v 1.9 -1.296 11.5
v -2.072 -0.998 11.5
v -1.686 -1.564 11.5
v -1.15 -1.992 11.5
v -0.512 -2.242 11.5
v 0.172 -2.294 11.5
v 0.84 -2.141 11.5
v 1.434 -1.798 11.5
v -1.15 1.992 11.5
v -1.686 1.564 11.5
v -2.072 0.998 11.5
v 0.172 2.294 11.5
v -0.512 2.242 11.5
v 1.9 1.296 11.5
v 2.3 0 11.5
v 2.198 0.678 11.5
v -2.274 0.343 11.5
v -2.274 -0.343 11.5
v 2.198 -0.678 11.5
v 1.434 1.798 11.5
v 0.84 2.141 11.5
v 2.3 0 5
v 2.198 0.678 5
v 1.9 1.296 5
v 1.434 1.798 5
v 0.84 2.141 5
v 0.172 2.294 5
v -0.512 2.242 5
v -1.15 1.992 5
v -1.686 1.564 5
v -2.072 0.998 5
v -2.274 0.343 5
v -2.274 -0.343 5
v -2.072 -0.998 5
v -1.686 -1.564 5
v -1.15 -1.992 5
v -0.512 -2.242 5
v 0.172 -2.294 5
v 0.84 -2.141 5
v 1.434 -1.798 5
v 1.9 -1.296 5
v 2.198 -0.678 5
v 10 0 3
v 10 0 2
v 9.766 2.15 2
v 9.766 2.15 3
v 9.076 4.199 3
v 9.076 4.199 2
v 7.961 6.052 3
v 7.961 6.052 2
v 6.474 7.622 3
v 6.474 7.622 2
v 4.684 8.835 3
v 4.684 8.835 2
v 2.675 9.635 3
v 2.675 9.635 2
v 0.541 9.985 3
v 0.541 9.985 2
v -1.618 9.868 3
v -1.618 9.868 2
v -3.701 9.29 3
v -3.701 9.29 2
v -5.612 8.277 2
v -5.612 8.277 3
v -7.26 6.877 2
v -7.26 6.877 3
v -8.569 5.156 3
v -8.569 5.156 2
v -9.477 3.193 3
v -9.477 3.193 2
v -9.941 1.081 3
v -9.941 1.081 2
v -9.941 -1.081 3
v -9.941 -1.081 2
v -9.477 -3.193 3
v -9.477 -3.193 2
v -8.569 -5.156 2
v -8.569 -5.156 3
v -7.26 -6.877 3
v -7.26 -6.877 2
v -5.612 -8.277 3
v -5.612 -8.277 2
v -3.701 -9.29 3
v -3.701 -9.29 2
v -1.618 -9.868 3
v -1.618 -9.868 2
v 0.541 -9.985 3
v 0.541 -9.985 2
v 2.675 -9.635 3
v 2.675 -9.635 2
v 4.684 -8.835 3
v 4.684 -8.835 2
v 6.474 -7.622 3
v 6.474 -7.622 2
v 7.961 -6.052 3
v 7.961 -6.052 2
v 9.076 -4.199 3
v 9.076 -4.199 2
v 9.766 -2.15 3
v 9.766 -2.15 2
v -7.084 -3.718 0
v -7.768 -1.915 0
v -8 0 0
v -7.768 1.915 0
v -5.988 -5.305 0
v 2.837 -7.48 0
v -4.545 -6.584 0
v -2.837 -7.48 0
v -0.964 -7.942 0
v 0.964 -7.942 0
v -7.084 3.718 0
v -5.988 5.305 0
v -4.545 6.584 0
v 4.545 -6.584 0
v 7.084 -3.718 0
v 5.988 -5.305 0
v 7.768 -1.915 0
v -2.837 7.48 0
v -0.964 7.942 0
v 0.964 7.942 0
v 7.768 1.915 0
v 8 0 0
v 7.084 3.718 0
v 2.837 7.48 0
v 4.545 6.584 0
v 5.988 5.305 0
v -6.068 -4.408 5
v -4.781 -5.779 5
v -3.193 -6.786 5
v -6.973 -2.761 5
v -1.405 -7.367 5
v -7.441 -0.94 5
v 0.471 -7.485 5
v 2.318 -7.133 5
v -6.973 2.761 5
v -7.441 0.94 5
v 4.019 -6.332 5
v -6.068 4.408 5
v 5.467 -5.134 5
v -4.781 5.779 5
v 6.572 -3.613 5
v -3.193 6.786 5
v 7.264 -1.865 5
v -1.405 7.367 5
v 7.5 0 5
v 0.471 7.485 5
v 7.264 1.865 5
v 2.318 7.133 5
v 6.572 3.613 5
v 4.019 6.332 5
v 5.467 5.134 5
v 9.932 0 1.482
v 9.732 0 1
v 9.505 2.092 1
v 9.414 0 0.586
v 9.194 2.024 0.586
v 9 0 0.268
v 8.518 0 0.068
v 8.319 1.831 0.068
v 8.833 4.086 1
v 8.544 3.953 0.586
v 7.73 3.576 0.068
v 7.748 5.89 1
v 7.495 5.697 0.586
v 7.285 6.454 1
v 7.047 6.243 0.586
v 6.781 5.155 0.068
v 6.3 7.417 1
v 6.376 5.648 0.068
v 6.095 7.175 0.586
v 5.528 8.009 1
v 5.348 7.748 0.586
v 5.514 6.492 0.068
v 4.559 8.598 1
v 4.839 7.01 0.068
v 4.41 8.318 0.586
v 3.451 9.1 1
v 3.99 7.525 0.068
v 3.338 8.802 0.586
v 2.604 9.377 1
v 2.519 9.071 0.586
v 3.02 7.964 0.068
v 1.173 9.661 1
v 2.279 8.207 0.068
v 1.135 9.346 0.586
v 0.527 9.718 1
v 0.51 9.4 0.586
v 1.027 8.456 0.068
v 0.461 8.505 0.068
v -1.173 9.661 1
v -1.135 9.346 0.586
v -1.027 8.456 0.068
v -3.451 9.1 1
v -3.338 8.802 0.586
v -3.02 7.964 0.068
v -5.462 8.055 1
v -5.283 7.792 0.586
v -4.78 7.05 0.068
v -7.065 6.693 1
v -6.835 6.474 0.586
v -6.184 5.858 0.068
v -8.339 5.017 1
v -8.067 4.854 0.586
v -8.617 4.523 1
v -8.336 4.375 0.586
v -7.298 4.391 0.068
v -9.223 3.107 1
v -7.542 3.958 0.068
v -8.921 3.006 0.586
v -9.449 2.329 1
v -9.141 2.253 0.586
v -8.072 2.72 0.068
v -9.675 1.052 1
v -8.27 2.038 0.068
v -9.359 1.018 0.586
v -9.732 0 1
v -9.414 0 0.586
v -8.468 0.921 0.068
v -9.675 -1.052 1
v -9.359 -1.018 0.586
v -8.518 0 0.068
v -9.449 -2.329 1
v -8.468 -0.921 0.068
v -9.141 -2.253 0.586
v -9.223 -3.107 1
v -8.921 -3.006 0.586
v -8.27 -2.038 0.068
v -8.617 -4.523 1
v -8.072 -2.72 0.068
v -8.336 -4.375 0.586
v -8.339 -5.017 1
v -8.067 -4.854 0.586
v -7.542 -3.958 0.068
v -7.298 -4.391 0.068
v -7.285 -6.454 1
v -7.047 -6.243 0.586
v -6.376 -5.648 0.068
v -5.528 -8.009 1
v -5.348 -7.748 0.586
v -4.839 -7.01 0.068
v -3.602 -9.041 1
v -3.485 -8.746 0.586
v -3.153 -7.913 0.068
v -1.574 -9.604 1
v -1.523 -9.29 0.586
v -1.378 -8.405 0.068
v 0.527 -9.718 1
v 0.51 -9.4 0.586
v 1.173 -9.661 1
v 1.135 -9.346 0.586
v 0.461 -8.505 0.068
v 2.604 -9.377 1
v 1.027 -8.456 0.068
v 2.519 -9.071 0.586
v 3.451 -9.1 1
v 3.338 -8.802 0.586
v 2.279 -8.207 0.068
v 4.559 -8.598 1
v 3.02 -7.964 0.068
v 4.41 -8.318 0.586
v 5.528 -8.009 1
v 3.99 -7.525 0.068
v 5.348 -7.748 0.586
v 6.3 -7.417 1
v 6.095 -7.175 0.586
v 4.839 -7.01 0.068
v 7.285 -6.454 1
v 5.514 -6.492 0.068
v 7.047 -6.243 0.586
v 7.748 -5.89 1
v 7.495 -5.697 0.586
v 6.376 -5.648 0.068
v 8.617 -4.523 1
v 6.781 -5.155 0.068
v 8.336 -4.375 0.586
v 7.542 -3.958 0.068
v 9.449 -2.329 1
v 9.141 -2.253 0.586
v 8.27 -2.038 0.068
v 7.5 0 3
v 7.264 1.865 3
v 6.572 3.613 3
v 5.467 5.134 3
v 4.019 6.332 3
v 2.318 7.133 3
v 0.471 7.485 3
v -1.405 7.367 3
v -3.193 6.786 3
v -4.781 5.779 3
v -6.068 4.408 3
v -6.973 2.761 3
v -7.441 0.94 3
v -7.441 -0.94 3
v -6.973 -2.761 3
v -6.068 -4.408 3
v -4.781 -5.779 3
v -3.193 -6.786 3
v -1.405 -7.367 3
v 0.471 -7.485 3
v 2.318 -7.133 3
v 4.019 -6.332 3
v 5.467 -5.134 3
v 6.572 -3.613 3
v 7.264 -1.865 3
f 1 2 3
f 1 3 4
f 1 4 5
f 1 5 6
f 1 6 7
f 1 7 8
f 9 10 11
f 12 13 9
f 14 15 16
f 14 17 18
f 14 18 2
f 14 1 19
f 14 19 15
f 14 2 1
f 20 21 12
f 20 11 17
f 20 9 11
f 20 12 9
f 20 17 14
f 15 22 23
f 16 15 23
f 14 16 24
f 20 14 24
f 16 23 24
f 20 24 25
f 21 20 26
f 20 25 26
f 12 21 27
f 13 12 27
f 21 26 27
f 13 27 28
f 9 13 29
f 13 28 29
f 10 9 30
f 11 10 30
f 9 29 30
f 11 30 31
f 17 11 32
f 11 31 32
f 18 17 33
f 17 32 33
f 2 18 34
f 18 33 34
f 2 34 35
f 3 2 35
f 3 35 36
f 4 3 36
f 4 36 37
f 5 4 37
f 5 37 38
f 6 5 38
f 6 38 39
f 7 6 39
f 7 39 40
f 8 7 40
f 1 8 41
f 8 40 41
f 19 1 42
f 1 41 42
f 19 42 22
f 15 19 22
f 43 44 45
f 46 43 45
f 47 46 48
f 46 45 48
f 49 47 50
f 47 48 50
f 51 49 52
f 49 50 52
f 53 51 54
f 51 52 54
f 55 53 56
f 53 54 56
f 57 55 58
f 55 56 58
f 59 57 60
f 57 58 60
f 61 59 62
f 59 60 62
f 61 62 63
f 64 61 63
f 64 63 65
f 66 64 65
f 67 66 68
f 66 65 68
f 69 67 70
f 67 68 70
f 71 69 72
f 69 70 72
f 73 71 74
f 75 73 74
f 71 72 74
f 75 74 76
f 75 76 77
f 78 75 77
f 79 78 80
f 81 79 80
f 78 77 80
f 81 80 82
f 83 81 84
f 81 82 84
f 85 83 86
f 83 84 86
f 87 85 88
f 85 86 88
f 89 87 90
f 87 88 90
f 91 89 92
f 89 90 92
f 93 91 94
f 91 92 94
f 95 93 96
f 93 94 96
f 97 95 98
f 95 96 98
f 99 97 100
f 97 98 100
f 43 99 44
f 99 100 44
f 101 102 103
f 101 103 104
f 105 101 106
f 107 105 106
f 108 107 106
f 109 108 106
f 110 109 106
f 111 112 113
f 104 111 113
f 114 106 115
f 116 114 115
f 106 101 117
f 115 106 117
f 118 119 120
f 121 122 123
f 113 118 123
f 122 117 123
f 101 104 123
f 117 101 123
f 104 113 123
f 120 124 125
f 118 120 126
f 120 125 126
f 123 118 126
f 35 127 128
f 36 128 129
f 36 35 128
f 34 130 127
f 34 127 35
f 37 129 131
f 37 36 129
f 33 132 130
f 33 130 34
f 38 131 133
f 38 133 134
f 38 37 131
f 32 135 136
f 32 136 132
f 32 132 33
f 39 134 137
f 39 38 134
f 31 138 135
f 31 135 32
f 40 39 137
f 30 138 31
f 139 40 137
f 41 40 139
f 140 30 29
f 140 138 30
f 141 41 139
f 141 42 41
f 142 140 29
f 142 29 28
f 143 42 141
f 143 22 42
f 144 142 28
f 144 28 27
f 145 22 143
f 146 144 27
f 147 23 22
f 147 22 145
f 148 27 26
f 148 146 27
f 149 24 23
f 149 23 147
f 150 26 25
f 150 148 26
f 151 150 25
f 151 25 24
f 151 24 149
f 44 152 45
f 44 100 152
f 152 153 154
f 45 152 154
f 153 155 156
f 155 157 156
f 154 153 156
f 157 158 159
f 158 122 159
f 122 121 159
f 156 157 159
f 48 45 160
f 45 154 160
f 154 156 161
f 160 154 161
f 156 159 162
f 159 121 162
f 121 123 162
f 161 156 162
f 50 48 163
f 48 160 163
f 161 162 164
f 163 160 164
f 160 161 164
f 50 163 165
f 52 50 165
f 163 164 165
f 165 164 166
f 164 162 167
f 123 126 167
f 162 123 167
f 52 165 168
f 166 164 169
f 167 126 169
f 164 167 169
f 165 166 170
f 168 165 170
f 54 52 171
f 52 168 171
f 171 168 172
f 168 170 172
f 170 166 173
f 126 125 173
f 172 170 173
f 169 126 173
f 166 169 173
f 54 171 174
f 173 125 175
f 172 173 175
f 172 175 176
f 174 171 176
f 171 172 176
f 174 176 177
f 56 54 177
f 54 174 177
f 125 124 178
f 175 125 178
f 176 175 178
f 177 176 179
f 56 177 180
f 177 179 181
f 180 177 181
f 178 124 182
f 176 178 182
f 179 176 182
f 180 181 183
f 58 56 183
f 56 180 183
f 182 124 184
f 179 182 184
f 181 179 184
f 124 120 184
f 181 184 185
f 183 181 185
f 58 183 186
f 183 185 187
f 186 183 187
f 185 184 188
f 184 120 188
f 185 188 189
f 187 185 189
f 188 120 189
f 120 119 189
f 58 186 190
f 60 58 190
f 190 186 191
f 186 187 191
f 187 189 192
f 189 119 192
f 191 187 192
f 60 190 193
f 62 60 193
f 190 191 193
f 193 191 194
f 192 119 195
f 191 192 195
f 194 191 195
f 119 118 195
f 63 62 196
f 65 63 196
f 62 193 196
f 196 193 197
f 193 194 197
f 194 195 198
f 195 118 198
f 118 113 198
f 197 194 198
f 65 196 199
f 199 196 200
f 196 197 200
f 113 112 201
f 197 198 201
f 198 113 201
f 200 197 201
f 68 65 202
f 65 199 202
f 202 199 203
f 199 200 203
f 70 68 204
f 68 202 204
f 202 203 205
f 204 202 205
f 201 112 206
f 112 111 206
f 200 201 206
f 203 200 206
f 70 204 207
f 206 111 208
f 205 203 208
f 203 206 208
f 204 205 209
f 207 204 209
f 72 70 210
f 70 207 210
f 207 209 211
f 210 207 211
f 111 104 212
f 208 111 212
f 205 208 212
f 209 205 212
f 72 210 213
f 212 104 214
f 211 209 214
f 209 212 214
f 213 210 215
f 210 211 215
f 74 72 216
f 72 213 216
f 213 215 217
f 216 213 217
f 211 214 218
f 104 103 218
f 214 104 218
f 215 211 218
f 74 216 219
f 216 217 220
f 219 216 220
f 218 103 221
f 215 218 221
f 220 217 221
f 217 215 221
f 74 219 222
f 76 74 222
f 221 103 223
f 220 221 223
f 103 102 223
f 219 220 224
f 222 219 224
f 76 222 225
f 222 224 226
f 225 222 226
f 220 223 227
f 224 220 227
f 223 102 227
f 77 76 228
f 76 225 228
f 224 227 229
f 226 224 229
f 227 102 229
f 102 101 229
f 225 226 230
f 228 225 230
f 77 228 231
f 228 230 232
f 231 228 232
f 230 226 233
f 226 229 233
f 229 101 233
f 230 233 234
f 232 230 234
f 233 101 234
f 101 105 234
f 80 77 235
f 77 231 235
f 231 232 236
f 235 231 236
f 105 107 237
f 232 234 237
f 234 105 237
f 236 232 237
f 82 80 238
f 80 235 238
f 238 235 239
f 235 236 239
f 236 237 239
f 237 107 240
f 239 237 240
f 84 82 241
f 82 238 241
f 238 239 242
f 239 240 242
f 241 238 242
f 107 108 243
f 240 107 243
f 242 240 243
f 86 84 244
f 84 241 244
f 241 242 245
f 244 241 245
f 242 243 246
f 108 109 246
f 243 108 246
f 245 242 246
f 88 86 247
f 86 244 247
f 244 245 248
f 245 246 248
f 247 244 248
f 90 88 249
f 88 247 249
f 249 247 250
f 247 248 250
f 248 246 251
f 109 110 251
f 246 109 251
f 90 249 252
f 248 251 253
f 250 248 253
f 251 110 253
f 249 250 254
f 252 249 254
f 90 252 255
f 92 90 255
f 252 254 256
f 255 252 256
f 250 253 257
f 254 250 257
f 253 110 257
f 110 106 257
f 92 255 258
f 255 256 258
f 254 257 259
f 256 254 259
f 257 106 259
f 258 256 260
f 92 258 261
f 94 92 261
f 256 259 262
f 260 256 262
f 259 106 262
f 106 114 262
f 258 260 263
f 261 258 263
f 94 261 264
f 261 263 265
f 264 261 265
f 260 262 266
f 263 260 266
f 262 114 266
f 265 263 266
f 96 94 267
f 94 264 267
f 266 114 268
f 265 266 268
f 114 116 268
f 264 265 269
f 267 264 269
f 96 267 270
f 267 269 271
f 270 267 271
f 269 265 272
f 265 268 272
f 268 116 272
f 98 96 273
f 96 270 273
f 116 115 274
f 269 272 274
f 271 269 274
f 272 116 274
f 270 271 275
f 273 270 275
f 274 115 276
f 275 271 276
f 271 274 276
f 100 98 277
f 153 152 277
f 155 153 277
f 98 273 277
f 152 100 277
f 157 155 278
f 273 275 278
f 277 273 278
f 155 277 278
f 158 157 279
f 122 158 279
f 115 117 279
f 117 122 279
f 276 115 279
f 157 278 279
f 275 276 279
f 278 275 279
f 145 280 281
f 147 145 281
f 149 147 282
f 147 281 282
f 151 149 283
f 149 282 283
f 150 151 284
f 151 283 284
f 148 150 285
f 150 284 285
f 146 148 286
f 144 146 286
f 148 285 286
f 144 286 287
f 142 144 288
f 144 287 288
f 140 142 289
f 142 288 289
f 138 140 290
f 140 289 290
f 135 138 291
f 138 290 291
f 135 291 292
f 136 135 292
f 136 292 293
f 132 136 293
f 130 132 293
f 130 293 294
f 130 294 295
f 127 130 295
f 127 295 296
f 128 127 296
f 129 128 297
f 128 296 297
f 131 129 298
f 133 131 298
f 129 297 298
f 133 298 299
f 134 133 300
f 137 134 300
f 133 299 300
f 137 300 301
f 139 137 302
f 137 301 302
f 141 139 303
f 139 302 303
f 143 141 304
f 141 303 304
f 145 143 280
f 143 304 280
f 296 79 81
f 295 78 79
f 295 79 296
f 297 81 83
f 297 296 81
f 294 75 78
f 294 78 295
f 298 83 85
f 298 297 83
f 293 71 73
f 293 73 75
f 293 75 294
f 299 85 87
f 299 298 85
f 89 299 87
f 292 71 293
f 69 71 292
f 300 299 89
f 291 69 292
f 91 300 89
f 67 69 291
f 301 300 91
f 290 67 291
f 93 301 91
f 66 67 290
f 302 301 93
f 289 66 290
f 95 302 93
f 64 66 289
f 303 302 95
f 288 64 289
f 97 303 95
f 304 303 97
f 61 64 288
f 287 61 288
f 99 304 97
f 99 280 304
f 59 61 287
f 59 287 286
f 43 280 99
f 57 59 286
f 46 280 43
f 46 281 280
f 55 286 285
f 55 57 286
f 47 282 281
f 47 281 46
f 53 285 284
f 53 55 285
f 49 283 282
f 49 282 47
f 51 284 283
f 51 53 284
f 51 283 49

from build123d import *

# Parameters (mm, degrees)
F0_R     = 10
F1_DEPTH = 3
F2_R     = 2
F3_R     = 7.5
F4_DEPTH = 2
F5_R     = 2.3
F6_DEPTH = 6.5


with BuildPart() as f1:
    # F0 (on Top) → F1 (new body)
    with BuildSketch(Plane.XY):
        Circle(F0_R)
    extrude(amount=F1_DEPTH)

    # F2
    f2_edges = [f1.edges().sort_by_distance(p)[0] for p in [
        (-10, 0, 0),
    ]]
    fillet(f2_edges, radius=F2_R)

    # F3 (on face) → F4 (join)
    with BuildSketch(Plane.XY.offset(3)):
        Circle(F3_R)
    extrude(amount=F4_DEPTH)

    # F5 (on face) → F6 (join)
    with BuildSketch(Plane.XY.offset(5)):
        Circle(F5_R)
    extrude(amount=F6_DEPTH)


solid = f1.part
